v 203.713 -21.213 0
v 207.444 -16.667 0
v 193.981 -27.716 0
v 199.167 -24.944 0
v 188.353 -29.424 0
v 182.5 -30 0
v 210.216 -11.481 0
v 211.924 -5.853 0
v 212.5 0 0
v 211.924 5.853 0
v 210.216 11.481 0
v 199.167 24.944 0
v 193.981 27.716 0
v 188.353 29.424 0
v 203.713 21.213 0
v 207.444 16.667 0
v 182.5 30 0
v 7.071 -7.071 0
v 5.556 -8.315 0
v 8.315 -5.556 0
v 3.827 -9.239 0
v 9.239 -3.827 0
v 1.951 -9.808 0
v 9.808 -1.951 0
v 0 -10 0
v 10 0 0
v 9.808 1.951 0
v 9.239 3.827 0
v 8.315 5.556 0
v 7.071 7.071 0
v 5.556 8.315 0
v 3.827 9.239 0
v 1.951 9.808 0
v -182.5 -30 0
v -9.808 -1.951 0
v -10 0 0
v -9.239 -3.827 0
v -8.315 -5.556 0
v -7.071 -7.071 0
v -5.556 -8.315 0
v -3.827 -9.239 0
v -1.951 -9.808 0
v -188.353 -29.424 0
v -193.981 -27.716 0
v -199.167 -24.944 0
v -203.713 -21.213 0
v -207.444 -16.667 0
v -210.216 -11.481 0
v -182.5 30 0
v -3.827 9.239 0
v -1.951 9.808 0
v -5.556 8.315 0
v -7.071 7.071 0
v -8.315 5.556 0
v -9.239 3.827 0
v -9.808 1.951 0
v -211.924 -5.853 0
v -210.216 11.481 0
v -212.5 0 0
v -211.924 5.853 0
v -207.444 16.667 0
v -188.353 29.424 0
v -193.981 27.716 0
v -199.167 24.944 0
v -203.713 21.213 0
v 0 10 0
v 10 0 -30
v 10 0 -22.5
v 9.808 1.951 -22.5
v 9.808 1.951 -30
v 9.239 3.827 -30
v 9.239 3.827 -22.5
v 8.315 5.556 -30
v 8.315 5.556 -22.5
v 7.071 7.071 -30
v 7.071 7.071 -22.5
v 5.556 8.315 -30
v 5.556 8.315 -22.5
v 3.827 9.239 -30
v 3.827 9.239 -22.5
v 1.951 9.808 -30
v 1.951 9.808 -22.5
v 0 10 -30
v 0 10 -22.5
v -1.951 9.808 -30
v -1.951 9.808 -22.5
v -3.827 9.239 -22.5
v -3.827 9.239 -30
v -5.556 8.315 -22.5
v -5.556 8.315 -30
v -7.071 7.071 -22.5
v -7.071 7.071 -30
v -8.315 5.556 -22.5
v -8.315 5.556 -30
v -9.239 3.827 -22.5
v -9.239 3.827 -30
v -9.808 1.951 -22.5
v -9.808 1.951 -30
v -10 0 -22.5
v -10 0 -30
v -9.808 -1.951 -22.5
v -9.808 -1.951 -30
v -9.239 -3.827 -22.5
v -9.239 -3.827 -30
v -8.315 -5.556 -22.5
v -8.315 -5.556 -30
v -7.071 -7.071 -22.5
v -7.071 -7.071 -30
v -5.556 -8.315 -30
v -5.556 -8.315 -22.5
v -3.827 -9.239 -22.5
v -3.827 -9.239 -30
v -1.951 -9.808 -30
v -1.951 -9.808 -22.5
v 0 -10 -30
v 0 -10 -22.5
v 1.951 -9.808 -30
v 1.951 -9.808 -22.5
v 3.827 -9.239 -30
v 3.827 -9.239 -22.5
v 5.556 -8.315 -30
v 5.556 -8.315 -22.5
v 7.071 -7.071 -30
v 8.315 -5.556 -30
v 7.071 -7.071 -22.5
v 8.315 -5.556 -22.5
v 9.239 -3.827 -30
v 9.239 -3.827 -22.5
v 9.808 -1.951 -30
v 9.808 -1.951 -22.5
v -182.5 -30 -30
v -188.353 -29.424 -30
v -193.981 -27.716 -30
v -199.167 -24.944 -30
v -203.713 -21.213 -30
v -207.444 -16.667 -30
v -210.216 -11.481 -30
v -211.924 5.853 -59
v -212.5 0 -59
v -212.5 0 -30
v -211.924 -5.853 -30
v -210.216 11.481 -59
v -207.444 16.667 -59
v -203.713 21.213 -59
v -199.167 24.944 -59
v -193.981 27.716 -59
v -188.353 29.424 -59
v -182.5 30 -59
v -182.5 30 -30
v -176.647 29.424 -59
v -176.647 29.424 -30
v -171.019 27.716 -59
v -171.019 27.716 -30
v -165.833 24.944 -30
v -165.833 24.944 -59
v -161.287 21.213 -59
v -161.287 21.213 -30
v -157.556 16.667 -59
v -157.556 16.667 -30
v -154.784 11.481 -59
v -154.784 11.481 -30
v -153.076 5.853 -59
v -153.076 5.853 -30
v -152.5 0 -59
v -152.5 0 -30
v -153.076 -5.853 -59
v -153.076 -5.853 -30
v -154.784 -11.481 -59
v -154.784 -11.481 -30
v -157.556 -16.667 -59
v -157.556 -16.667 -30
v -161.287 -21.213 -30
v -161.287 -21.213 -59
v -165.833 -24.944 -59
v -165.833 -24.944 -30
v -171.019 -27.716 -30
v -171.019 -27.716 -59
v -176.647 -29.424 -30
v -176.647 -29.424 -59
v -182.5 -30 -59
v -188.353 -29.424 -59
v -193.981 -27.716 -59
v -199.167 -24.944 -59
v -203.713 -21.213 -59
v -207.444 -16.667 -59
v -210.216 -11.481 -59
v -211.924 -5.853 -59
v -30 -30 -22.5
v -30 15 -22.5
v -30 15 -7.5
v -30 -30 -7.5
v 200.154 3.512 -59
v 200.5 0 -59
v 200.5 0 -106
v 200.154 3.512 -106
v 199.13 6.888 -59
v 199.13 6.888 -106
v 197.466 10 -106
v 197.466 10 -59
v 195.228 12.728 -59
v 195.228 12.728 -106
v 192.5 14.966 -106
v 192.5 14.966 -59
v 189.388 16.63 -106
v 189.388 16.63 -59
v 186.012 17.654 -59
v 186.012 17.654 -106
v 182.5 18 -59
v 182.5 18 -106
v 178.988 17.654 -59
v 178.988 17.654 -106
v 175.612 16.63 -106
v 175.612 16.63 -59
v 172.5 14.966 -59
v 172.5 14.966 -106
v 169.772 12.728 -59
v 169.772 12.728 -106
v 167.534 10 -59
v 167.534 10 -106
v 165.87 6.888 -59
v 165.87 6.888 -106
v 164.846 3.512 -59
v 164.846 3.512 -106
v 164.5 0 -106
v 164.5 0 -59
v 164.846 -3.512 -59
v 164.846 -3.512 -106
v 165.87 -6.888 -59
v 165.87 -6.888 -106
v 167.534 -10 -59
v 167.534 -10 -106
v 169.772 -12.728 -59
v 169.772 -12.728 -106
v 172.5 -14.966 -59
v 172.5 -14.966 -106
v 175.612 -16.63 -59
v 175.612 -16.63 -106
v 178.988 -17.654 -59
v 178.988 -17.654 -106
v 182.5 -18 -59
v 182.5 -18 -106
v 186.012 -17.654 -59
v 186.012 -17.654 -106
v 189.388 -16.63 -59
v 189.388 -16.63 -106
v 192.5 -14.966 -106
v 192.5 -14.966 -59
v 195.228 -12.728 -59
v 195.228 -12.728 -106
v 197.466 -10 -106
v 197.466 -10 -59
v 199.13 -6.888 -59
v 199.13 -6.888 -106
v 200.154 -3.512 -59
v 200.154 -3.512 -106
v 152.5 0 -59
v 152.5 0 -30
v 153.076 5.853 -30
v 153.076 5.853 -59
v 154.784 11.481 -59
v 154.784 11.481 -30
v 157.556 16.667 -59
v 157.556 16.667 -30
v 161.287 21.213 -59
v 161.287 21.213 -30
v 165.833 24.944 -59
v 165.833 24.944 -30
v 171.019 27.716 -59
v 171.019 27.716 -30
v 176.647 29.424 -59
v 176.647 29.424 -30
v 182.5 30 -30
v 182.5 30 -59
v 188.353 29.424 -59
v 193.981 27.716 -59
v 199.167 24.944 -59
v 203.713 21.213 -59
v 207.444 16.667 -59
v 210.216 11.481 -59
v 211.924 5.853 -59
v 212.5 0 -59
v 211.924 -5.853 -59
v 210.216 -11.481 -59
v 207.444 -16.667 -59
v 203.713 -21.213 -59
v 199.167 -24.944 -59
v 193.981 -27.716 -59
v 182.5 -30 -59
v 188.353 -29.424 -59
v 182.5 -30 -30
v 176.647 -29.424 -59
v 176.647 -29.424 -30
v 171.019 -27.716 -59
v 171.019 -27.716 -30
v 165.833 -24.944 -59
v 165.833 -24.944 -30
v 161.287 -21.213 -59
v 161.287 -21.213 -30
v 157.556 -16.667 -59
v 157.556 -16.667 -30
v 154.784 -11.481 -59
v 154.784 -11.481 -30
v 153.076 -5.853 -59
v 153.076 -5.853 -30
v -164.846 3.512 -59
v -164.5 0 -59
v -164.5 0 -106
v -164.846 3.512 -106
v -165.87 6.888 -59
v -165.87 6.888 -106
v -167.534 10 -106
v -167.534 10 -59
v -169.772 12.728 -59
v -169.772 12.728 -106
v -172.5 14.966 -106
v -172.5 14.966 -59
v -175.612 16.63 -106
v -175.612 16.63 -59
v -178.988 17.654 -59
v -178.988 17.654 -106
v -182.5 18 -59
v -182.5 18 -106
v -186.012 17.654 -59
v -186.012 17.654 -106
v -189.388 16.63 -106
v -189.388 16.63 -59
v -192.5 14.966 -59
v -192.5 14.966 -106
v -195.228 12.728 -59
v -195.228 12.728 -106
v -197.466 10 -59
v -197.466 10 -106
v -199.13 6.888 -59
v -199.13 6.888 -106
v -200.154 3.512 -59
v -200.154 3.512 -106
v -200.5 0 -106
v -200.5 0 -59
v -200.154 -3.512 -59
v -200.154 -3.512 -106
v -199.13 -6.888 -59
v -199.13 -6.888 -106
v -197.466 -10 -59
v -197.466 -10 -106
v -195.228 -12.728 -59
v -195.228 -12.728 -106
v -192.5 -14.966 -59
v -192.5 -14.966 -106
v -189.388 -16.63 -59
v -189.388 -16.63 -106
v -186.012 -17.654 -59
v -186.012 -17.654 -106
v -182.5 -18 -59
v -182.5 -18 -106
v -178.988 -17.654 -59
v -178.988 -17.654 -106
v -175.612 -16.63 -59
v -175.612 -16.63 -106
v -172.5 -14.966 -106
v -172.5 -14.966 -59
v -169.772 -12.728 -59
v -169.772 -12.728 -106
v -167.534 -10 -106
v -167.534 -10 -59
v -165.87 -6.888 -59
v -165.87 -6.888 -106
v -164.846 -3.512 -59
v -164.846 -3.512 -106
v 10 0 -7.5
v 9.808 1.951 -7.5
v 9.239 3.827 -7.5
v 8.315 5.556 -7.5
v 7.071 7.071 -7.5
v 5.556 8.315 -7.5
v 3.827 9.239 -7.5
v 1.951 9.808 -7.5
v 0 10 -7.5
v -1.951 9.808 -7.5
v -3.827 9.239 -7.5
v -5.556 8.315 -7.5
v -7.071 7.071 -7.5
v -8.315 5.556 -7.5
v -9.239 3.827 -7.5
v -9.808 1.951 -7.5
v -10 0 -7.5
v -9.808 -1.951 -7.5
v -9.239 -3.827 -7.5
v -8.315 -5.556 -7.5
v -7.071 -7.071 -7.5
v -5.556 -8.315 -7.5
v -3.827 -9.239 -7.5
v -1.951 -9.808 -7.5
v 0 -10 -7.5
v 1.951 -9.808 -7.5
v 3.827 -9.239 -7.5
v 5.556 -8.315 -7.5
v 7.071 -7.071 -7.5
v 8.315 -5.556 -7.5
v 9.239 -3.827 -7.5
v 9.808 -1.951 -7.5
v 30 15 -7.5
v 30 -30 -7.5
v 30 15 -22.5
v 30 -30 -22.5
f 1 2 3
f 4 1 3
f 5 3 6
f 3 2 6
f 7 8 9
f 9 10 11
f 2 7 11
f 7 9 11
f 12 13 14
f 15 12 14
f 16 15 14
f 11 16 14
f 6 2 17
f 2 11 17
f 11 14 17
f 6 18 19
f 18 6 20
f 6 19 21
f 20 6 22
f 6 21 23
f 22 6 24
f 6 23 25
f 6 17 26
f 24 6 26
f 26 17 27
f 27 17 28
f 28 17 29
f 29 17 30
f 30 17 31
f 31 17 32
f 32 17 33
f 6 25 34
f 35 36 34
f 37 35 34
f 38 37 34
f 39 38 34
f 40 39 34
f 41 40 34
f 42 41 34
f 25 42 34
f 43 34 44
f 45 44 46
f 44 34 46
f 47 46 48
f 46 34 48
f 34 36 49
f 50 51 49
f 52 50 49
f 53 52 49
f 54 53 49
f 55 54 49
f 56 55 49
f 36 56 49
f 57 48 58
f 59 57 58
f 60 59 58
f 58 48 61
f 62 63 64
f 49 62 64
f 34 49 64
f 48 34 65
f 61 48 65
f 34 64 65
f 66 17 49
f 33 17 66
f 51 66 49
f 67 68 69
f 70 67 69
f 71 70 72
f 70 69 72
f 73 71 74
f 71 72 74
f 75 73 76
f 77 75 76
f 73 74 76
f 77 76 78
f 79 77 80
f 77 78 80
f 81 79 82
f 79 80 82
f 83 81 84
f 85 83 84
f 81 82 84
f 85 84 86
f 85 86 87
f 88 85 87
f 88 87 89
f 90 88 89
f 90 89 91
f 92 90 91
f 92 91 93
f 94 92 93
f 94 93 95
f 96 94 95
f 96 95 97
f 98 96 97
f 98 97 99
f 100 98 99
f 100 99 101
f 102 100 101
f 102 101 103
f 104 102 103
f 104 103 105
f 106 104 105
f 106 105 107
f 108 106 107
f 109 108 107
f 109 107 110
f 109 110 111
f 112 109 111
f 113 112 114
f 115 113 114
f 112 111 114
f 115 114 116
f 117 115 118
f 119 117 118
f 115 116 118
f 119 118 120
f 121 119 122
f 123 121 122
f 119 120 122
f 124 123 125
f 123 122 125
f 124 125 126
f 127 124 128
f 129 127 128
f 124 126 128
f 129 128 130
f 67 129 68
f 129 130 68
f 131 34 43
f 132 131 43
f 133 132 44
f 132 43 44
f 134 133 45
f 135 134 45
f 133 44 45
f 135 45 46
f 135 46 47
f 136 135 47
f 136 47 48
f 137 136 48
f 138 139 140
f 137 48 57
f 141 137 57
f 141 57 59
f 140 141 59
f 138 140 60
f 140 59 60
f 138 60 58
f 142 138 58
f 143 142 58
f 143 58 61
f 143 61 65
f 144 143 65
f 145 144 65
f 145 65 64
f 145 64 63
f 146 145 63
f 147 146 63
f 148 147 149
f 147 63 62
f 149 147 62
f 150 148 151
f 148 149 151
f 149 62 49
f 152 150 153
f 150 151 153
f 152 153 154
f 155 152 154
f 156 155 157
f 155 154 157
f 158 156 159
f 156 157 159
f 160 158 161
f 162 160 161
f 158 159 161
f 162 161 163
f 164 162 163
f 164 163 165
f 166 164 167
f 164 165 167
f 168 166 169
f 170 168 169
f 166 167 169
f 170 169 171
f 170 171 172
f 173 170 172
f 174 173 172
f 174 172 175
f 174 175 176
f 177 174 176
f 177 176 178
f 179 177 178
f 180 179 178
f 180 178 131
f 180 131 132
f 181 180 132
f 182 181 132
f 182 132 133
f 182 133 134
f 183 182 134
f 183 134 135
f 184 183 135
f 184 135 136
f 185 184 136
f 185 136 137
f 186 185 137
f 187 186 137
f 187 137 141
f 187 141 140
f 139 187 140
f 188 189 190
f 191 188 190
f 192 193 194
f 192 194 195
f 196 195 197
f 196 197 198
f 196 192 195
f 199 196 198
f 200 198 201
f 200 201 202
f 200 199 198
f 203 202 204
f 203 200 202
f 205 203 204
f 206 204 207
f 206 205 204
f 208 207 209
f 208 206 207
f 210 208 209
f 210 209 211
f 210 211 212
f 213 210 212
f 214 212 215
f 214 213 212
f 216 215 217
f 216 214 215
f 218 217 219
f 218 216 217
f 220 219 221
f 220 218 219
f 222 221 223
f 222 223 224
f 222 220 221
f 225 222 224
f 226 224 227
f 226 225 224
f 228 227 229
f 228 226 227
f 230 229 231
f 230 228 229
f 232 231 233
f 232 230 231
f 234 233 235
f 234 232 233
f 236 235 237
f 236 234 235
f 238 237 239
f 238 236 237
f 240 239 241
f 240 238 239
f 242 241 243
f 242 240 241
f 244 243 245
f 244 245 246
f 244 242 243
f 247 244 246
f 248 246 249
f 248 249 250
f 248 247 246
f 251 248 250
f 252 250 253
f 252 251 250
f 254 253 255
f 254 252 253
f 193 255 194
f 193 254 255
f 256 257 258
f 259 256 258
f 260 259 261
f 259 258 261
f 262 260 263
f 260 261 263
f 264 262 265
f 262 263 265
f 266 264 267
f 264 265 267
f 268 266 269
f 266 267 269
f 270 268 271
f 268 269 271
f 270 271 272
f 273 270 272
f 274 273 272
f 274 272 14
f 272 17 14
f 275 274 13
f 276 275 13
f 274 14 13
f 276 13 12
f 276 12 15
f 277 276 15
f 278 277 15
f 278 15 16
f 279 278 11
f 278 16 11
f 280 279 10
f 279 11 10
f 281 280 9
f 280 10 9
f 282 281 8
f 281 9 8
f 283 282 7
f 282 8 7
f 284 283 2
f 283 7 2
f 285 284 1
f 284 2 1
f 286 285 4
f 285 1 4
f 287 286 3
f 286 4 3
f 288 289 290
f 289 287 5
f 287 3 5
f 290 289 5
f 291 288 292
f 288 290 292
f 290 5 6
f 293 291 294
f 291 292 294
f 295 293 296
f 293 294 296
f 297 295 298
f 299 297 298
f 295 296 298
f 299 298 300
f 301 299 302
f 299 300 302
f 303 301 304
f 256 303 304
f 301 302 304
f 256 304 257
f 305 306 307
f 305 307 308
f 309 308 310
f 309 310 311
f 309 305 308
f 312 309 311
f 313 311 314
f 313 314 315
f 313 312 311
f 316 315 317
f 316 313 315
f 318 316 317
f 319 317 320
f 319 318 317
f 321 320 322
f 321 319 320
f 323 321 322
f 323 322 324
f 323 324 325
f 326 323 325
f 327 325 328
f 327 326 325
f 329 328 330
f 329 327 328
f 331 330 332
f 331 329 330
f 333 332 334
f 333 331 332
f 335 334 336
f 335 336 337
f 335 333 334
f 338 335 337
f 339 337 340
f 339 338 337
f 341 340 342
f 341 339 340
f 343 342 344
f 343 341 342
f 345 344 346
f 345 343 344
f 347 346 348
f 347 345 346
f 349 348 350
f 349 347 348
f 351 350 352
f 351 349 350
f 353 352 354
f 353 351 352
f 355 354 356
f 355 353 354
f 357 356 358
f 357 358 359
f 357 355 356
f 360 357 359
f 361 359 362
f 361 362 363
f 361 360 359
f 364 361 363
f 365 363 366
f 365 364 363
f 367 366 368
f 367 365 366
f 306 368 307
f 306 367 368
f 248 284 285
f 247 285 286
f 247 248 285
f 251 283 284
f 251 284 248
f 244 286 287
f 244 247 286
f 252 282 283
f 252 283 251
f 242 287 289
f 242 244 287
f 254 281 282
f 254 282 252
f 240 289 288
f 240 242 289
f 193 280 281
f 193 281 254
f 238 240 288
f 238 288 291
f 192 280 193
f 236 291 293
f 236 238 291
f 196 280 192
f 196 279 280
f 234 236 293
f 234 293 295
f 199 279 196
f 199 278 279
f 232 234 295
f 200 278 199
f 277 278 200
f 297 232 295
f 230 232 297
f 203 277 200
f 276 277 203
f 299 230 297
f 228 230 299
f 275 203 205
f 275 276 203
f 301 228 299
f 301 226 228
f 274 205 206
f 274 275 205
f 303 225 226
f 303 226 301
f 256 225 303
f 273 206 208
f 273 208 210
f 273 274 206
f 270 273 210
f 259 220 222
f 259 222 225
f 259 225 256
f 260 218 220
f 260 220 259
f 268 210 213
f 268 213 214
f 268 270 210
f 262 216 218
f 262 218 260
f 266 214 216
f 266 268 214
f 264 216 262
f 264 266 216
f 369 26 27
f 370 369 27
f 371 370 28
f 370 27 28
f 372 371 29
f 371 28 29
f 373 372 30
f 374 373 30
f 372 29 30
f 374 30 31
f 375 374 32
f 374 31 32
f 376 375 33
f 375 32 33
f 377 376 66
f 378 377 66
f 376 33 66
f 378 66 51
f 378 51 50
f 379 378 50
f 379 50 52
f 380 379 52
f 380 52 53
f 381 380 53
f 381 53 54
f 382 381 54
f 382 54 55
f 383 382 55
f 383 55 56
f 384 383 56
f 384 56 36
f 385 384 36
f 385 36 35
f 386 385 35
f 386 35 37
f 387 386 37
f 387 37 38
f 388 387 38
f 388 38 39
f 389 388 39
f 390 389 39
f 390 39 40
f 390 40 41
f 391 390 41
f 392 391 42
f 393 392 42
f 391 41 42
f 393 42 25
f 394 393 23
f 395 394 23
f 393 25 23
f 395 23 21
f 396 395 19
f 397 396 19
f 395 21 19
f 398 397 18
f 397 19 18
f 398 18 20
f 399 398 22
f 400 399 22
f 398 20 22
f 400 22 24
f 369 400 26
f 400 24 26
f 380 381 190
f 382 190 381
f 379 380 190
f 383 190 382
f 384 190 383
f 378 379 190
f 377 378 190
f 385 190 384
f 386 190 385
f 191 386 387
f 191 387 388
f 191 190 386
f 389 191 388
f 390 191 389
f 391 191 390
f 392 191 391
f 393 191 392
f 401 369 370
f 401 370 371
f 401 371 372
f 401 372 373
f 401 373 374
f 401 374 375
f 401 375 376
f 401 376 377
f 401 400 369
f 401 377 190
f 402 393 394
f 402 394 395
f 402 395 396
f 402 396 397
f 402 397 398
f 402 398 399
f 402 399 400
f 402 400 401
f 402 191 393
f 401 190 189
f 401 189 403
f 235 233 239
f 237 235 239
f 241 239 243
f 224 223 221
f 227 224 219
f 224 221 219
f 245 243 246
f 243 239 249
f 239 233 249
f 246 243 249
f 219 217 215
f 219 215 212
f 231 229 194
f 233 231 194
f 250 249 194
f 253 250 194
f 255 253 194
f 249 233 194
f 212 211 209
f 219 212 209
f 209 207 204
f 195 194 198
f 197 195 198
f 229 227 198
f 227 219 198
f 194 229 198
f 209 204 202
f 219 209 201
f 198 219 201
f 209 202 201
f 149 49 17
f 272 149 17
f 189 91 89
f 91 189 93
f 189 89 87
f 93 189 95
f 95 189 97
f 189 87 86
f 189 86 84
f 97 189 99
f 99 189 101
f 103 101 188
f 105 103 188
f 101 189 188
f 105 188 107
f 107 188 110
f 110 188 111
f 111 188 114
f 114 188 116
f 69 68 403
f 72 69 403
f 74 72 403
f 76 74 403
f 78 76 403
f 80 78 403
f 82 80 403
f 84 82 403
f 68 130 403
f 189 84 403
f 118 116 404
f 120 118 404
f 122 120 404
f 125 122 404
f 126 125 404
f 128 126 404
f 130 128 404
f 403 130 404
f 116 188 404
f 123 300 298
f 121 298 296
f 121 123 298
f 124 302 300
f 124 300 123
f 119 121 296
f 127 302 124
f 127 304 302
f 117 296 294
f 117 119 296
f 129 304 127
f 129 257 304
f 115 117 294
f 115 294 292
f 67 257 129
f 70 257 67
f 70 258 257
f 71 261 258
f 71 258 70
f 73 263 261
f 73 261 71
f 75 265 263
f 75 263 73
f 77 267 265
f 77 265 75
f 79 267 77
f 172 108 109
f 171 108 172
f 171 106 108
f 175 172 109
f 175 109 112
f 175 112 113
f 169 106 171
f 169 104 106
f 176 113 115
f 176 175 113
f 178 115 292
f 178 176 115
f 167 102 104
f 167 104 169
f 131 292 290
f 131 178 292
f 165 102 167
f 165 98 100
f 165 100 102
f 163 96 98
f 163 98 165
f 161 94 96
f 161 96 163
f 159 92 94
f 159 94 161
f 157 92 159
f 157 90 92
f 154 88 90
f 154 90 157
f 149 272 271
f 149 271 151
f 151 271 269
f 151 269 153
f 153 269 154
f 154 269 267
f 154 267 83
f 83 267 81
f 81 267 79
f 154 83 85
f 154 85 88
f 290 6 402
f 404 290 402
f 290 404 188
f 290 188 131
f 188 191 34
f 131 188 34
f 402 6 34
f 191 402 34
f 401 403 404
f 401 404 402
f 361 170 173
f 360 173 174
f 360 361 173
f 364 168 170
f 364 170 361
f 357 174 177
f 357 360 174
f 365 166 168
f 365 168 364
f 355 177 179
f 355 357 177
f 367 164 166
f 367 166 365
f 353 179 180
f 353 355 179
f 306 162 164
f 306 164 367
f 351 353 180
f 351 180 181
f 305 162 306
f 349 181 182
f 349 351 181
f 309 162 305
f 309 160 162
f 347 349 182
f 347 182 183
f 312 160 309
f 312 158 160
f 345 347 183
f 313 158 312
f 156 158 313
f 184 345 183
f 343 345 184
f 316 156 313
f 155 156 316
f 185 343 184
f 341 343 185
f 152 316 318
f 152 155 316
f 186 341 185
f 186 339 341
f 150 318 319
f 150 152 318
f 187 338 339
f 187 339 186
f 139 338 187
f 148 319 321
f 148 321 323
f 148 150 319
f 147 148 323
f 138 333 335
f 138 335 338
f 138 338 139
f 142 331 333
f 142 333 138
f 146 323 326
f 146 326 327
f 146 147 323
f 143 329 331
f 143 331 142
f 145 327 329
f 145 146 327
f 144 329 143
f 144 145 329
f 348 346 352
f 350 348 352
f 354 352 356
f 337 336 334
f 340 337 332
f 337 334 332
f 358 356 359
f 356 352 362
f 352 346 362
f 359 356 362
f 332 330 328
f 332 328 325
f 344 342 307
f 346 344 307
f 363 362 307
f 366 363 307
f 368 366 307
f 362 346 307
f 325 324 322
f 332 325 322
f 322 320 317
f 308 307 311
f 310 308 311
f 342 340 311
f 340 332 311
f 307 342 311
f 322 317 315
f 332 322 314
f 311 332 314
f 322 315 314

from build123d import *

# Parameters (mm, degrees)
BOSS_EXTRUDE1_DEPTH = 30
SKETCH2_R           = 30
BOSS_EXTRUDE2_DEPTH = 29
SKETCH1_3_R         = 10
CUT_EXTRUDE1_DEPTH  = 30
BOSS_EXTRUDE3_START = -59
SKETCH1_4_R         = 18
BOSS_EXTRUDE3_DEPTH = 47
SKETCH3_W           = 60
SKETCH3_H           = 15
CUT_EXTRUDE2_DEPTH  = 45


with BuildPart() as part:
    # Sketch1 → Boss-Extrude1 (new body)
    with BuildSketch(Plane.XY):
        with BuildLine():
            Line((-182.5, 30), (182.5, 30))
            ThreePointArc((182.5, 30), (212.5, 0), (182.5, -30))
            Line((182.5, -30), (-182.5, -30))
            ThreePointArc((-182.5, -30), (-212.5, 0), (-182.5, 30))
        make_face()
    extrude(amount=-BOSS_EXTRUDE1_DEPTH)

    # Sketch2 → Boss-Extrude2 (add)
    with BuildSketch(Plane(origin=(0, 0, -30), x_dir=(-1, 0, 0), z_dir=(0, 0, -1))):
        with Locations((-182.5, 0)):
            Circle(SKETCH2_R)
        with Locations((182.5, 0)):
            Circle(SKETCH2_R)
    extrude(amount=BOSS_EXTRUDE2_DEPTH)

    # Sketch1<3> → Cut-Extrude1 (cut)
    with BuildSketch(Plane.XY):
        Circle(SKETCH1_3_R)
    extrude(amount=-CUT_EXTRUDE1_DEPTH, mode=Mode.SUBTRACT)

    # Sketch1<4> → Boss-Extrude3 (add)
    with BuildSketch(Plane.XY.offset(BOSS_EXTRUDE3_START)):
        with Locations((182.5, 0)):
            Circle(SKETCH1_4_R)
        with Locations((-182.5, 0)):
            Circle(SKETCH1_4_R)
    extrude(amount=-BOSS_EXTRUDE3_DEPTH)

    # Sketch3 → Cut-Extrude2 (cut)
    with BuildSketch(Plane.XZ.offset(30)):
        with Locations((0, -15)):
            Rectangle(SKETCH3_W, SKETCH3_H)
    extrude(amount=-CUT_EXTRUDE2_DEPTH, mode=Mode.SUBTRACT)


solid = part.part
